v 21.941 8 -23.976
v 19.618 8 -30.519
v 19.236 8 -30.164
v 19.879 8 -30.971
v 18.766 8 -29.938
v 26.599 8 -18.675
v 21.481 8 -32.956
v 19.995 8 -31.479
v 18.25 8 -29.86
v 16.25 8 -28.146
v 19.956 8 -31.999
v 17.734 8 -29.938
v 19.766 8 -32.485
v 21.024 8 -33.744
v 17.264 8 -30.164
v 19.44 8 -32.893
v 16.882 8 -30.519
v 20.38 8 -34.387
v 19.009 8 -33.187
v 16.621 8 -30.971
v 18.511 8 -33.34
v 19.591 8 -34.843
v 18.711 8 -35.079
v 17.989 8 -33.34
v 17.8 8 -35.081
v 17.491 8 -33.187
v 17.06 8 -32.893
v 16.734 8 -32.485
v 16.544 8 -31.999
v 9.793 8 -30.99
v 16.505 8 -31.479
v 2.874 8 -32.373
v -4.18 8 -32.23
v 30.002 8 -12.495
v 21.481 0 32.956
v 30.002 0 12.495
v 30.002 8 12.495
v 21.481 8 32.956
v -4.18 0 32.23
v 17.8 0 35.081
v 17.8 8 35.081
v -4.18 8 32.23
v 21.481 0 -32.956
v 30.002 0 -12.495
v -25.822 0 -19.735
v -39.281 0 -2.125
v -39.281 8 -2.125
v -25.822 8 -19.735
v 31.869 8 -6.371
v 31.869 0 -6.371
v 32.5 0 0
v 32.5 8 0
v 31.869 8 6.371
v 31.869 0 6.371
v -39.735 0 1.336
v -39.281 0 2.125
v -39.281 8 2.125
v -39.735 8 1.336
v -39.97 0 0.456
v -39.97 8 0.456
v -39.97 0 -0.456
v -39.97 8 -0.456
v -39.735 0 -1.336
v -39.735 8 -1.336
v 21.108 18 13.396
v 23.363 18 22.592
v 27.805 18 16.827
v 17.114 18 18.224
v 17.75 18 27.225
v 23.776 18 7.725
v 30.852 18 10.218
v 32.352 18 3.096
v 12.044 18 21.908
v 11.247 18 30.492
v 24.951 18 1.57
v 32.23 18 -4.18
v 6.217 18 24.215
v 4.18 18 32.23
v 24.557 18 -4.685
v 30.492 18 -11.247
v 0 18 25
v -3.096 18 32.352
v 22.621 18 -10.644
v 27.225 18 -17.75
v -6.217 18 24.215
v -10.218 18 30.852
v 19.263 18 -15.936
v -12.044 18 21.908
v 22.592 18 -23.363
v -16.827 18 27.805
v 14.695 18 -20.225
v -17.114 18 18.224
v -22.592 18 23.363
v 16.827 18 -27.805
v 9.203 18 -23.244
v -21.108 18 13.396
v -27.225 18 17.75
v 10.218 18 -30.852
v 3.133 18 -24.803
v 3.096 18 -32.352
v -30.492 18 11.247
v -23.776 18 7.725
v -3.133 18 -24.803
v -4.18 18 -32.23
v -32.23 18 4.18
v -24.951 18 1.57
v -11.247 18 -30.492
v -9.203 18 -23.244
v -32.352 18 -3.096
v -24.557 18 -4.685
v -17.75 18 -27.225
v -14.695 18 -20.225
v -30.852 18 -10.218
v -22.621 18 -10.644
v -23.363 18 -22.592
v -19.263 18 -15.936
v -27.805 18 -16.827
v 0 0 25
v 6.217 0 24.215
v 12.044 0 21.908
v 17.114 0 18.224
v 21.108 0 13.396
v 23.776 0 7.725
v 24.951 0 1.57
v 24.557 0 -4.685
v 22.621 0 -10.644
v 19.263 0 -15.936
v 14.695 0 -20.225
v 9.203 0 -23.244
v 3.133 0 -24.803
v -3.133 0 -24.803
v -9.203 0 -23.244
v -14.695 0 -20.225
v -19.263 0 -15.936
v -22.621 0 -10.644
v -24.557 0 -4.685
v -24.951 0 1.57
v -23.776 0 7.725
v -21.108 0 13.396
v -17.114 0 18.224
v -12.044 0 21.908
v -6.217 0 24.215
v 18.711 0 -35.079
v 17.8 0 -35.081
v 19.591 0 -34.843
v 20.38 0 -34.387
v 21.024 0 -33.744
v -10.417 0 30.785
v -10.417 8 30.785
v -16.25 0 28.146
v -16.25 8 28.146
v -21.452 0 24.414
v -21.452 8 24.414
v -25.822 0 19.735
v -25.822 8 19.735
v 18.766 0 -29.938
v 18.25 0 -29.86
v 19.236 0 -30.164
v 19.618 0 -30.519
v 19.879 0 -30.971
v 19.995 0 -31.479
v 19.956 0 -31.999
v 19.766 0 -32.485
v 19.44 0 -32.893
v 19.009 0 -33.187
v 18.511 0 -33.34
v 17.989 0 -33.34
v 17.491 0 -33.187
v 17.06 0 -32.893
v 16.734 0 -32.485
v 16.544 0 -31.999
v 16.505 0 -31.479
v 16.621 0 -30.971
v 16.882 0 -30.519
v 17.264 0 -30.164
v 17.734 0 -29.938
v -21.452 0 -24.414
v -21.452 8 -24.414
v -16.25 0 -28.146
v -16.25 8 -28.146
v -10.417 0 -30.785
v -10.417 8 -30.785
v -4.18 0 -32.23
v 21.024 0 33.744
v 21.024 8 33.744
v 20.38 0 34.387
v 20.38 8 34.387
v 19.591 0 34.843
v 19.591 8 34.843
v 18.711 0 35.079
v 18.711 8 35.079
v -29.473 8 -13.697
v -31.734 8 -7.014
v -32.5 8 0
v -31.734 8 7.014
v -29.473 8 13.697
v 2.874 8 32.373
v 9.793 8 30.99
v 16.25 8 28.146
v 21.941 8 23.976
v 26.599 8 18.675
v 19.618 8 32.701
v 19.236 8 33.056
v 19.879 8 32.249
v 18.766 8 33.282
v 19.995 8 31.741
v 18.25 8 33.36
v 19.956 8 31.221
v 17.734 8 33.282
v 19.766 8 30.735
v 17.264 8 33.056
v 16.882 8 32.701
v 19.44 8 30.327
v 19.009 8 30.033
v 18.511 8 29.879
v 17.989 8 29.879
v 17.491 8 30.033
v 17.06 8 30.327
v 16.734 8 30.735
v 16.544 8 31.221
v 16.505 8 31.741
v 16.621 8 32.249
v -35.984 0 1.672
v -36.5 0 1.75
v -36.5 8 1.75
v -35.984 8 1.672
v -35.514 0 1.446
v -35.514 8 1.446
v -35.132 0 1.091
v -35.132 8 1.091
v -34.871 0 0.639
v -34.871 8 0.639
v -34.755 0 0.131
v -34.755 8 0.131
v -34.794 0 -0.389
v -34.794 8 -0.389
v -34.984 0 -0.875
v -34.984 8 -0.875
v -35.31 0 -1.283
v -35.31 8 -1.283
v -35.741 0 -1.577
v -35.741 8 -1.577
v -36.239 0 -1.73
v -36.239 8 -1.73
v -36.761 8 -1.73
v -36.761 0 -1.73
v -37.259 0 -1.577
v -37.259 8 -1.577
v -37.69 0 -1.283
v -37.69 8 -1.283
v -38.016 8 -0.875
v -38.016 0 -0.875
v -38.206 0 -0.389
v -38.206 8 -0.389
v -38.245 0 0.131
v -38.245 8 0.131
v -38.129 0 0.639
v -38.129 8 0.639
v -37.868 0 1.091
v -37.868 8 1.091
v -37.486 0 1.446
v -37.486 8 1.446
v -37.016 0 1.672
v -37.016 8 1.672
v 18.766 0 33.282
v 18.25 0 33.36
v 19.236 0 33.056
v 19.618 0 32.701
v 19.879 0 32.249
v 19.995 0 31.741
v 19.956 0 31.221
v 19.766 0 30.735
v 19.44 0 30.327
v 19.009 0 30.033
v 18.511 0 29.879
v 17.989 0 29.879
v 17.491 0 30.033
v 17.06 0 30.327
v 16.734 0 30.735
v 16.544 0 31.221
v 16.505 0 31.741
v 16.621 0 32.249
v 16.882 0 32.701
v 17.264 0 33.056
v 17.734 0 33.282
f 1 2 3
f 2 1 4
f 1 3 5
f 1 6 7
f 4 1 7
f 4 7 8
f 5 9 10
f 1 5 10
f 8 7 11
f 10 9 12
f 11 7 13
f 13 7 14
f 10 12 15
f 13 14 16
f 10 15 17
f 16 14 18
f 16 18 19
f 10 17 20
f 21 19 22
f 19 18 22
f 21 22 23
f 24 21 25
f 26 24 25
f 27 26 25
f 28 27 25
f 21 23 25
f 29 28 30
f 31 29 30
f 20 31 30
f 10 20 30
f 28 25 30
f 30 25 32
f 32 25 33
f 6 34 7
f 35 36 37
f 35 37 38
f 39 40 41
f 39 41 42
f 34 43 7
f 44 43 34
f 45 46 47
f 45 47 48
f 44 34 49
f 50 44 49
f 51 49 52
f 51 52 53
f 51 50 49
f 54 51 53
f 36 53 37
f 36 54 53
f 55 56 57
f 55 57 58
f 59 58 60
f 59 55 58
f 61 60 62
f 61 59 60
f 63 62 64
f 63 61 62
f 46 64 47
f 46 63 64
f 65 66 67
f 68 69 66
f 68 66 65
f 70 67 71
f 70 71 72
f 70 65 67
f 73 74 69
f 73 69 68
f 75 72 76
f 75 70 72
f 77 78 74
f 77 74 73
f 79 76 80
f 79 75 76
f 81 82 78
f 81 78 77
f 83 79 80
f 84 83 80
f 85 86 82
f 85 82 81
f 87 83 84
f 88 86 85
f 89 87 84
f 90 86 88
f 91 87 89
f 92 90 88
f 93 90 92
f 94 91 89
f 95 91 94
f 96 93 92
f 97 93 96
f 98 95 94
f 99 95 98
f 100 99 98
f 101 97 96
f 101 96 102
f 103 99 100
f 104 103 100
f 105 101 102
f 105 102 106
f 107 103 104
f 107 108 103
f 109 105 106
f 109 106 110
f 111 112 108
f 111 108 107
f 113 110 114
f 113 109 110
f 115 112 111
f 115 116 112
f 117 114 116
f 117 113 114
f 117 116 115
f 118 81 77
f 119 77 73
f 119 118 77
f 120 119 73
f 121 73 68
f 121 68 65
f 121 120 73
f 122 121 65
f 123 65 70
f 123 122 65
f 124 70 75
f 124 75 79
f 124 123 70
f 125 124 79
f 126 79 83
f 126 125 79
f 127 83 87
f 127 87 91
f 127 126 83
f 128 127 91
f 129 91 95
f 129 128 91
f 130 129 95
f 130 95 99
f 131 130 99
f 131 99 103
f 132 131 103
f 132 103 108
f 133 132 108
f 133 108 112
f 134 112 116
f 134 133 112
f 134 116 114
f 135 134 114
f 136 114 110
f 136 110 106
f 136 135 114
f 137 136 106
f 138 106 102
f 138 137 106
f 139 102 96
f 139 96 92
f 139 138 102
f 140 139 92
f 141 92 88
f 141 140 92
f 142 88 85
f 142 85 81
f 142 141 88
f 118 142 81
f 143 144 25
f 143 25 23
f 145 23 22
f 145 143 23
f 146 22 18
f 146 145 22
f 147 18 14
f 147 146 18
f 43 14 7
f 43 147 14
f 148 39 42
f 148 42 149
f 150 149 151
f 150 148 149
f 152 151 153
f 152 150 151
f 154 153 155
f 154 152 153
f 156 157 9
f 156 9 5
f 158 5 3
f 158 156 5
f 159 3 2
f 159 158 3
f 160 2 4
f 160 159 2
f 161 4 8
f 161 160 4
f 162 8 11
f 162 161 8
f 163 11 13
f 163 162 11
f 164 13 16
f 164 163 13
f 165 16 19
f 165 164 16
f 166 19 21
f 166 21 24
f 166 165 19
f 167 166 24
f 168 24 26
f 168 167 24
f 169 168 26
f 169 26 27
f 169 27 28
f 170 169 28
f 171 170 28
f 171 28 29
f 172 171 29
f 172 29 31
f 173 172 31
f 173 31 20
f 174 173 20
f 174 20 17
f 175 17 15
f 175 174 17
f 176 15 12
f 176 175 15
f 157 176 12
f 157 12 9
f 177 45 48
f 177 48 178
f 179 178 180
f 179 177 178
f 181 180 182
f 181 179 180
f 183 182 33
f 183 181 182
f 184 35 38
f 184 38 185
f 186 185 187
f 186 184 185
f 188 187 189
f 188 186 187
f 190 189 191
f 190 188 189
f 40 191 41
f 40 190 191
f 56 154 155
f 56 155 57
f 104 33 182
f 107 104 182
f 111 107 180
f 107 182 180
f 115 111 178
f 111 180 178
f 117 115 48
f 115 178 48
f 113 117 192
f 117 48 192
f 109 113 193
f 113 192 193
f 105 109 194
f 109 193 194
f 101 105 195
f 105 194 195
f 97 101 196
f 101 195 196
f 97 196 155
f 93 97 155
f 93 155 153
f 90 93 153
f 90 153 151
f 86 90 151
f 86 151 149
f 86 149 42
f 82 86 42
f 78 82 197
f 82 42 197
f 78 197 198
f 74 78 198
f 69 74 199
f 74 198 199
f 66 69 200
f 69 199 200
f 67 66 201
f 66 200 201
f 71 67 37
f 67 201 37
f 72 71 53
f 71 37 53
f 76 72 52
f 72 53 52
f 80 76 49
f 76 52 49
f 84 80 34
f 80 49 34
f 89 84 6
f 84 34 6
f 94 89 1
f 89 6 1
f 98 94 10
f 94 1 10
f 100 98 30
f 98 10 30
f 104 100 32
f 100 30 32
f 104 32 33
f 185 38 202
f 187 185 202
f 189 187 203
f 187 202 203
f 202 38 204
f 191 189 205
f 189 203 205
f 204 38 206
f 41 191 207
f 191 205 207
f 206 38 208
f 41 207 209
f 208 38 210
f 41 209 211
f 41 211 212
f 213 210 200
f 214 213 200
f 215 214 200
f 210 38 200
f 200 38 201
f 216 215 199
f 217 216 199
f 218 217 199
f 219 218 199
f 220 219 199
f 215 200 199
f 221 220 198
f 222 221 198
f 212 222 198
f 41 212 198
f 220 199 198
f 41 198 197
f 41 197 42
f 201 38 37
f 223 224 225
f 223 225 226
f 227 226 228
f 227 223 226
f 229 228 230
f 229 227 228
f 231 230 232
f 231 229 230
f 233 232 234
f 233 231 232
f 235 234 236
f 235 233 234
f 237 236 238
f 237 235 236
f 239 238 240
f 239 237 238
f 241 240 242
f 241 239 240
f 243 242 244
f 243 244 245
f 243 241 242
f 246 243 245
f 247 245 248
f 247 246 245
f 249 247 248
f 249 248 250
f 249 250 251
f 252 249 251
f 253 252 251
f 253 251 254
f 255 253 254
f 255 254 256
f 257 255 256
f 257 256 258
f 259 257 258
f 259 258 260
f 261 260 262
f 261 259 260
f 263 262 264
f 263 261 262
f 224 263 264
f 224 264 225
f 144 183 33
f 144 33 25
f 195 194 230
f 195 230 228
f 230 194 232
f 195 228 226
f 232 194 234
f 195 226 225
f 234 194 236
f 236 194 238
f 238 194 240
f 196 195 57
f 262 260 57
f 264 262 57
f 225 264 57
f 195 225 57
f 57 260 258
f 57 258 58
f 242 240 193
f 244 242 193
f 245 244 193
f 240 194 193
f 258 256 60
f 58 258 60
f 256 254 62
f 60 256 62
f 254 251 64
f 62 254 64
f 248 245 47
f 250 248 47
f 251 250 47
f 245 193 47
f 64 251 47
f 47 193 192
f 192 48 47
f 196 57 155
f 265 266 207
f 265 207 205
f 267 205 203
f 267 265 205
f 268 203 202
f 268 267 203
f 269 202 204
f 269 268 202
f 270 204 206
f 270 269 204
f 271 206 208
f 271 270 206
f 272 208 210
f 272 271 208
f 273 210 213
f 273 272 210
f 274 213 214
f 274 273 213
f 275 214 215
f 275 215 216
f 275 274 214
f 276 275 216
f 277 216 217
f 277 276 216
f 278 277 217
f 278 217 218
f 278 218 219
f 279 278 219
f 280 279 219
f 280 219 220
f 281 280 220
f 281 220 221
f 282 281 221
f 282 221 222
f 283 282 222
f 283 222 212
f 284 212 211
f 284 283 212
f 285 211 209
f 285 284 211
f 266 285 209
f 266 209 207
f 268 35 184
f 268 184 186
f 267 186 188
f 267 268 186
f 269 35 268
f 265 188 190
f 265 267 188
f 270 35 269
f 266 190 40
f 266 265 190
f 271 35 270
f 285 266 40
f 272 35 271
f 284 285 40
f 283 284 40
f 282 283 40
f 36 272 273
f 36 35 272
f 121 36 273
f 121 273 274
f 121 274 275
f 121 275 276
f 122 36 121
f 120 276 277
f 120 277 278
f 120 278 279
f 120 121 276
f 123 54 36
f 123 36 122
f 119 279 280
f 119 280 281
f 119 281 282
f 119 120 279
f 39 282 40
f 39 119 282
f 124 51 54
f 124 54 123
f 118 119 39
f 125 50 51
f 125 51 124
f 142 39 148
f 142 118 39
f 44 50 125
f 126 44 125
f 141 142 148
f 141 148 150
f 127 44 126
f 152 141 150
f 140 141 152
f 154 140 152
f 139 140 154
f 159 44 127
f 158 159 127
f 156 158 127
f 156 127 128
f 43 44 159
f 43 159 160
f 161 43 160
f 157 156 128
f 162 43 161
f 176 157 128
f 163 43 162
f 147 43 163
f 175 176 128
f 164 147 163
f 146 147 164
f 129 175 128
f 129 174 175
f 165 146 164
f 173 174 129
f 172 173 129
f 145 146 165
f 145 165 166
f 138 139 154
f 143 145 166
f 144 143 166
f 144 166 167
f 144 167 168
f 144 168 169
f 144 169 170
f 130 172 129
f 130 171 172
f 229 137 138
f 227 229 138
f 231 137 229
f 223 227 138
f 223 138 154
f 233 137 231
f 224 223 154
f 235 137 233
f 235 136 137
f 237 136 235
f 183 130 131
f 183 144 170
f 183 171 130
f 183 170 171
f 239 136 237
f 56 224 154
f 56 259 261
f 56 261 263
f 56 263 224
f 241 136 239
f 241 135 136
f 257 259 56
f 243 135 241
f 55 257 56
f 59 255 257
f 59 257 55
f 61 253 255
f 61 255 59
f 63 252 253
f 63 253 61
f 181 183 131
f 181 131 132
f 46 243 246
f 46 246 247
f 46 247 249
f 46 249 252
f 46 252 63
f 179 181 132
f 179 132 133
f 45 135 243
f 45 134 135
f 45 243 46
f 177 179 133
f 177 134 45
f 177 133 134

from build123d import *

# Parameters (mm, degrees)
CROQUIS1_R              = 25
CROQUIS1_R_2            = 1.75
SALIENTE_EXTRUIR1_DEPTH = 8
CROQUIS2_R              = 32.5
CROQUIS2_R_2            = 25
SALIENTE_EXTRUIR2_DEPTH = 10


with BuildPart() as part:
    # Croquis1 → Saliente-Extruir1 (new body)
    with BuildSketch(Plane(origin=(0, 0, 0), x_dir=(1, 0, 0), z_dir=(0, 1, 0))):
        with BuildLine():
            Line((-39.280821918, 2.125330436), (-25.821917808, 19.73521119))
            ThreePointArc((-25.821917808, 19.73521119), (-16.25, 28.145825623), (-4.180235335, 32.230042391))
            Line((-4.180235335, 32.230042391), (17.79982081, 35.08085488))
            ThreePointArc((17.79982081, 35.08085488), (20, 34.641016151), (21.481001108, 32.955524444))
            Line((21.481001108, 32.955524444), (30.002153144, 12.494831201))
            ThreePointArc((30.002153144, 12.494831201), (32.5, 0), (30.002153144, -12.494831201))
            Line((30.002153144, -12.494831201), (21.481001108, -32.955524444))
            ThreePointArc((21.481001108, -32.955524444), (20, -34.641016151), (17.79982081, -35.08085488))
            Line((17.79982081, -35.08085488), (-4.180235335, -32.230042391))
            ThreePointArc((-4.180235335, -32.230042391), (-16.25, -28.145825623), (-25.821917808, -19.73521119))
            Line((-25.821917808, -19.73521119), (-39.280821918, -2.125330436))
            ThreePointArc((-39.280821918, -2.125330436), (-40, 0), (-39.280821918, 2.125330436))
        make_face()
        with Locations(Location((0, 0, 0), (0, 0, 270))):
            Circle(CROQUIS1_R, mode=Mode.SUBTRACT)
        with Locations(Location((18.25, 31.609927238, 0), (0, 0, 270))):
            Circle(CROQUIS1_R_2, mode=Mode.SUBTRACT)
        with Locations(Location((-36.5, 0, 0), (0, 0, 270))):
            Circle(CROQUIS1_R_2, mode=Mode.SUBTRACT)
        with Locations(Location((18.25, -31.609927238, 0), (0, 0, 270))):
            Circle(CROQUIS1_R_2, mode=Mode.SUBTRACT)
    extrude(amount=SALIENTE_EXTRUIR1_DEPTH)

    # Croquis2 → Saliente-Extruir2 (add)
    with BuildSketch(Plane(origin=(0, 8, 0), x_dir=(1, 0, 0), z_dir=(0, 1, 0))):
        with Locations(Location((0, 0, 0), (0, 0, 97.390006376))):
            Circle(CROQUIS2_R)
        with Locations(Location((0, 0, 0), (0, 0, 270))):
            Circle(CROQUIS2_R_2, mode=Mode.SUBTRACT)
    extrude(amount=SALIENTE_EXTRUIR2_DEPTH)


solid = part.part
